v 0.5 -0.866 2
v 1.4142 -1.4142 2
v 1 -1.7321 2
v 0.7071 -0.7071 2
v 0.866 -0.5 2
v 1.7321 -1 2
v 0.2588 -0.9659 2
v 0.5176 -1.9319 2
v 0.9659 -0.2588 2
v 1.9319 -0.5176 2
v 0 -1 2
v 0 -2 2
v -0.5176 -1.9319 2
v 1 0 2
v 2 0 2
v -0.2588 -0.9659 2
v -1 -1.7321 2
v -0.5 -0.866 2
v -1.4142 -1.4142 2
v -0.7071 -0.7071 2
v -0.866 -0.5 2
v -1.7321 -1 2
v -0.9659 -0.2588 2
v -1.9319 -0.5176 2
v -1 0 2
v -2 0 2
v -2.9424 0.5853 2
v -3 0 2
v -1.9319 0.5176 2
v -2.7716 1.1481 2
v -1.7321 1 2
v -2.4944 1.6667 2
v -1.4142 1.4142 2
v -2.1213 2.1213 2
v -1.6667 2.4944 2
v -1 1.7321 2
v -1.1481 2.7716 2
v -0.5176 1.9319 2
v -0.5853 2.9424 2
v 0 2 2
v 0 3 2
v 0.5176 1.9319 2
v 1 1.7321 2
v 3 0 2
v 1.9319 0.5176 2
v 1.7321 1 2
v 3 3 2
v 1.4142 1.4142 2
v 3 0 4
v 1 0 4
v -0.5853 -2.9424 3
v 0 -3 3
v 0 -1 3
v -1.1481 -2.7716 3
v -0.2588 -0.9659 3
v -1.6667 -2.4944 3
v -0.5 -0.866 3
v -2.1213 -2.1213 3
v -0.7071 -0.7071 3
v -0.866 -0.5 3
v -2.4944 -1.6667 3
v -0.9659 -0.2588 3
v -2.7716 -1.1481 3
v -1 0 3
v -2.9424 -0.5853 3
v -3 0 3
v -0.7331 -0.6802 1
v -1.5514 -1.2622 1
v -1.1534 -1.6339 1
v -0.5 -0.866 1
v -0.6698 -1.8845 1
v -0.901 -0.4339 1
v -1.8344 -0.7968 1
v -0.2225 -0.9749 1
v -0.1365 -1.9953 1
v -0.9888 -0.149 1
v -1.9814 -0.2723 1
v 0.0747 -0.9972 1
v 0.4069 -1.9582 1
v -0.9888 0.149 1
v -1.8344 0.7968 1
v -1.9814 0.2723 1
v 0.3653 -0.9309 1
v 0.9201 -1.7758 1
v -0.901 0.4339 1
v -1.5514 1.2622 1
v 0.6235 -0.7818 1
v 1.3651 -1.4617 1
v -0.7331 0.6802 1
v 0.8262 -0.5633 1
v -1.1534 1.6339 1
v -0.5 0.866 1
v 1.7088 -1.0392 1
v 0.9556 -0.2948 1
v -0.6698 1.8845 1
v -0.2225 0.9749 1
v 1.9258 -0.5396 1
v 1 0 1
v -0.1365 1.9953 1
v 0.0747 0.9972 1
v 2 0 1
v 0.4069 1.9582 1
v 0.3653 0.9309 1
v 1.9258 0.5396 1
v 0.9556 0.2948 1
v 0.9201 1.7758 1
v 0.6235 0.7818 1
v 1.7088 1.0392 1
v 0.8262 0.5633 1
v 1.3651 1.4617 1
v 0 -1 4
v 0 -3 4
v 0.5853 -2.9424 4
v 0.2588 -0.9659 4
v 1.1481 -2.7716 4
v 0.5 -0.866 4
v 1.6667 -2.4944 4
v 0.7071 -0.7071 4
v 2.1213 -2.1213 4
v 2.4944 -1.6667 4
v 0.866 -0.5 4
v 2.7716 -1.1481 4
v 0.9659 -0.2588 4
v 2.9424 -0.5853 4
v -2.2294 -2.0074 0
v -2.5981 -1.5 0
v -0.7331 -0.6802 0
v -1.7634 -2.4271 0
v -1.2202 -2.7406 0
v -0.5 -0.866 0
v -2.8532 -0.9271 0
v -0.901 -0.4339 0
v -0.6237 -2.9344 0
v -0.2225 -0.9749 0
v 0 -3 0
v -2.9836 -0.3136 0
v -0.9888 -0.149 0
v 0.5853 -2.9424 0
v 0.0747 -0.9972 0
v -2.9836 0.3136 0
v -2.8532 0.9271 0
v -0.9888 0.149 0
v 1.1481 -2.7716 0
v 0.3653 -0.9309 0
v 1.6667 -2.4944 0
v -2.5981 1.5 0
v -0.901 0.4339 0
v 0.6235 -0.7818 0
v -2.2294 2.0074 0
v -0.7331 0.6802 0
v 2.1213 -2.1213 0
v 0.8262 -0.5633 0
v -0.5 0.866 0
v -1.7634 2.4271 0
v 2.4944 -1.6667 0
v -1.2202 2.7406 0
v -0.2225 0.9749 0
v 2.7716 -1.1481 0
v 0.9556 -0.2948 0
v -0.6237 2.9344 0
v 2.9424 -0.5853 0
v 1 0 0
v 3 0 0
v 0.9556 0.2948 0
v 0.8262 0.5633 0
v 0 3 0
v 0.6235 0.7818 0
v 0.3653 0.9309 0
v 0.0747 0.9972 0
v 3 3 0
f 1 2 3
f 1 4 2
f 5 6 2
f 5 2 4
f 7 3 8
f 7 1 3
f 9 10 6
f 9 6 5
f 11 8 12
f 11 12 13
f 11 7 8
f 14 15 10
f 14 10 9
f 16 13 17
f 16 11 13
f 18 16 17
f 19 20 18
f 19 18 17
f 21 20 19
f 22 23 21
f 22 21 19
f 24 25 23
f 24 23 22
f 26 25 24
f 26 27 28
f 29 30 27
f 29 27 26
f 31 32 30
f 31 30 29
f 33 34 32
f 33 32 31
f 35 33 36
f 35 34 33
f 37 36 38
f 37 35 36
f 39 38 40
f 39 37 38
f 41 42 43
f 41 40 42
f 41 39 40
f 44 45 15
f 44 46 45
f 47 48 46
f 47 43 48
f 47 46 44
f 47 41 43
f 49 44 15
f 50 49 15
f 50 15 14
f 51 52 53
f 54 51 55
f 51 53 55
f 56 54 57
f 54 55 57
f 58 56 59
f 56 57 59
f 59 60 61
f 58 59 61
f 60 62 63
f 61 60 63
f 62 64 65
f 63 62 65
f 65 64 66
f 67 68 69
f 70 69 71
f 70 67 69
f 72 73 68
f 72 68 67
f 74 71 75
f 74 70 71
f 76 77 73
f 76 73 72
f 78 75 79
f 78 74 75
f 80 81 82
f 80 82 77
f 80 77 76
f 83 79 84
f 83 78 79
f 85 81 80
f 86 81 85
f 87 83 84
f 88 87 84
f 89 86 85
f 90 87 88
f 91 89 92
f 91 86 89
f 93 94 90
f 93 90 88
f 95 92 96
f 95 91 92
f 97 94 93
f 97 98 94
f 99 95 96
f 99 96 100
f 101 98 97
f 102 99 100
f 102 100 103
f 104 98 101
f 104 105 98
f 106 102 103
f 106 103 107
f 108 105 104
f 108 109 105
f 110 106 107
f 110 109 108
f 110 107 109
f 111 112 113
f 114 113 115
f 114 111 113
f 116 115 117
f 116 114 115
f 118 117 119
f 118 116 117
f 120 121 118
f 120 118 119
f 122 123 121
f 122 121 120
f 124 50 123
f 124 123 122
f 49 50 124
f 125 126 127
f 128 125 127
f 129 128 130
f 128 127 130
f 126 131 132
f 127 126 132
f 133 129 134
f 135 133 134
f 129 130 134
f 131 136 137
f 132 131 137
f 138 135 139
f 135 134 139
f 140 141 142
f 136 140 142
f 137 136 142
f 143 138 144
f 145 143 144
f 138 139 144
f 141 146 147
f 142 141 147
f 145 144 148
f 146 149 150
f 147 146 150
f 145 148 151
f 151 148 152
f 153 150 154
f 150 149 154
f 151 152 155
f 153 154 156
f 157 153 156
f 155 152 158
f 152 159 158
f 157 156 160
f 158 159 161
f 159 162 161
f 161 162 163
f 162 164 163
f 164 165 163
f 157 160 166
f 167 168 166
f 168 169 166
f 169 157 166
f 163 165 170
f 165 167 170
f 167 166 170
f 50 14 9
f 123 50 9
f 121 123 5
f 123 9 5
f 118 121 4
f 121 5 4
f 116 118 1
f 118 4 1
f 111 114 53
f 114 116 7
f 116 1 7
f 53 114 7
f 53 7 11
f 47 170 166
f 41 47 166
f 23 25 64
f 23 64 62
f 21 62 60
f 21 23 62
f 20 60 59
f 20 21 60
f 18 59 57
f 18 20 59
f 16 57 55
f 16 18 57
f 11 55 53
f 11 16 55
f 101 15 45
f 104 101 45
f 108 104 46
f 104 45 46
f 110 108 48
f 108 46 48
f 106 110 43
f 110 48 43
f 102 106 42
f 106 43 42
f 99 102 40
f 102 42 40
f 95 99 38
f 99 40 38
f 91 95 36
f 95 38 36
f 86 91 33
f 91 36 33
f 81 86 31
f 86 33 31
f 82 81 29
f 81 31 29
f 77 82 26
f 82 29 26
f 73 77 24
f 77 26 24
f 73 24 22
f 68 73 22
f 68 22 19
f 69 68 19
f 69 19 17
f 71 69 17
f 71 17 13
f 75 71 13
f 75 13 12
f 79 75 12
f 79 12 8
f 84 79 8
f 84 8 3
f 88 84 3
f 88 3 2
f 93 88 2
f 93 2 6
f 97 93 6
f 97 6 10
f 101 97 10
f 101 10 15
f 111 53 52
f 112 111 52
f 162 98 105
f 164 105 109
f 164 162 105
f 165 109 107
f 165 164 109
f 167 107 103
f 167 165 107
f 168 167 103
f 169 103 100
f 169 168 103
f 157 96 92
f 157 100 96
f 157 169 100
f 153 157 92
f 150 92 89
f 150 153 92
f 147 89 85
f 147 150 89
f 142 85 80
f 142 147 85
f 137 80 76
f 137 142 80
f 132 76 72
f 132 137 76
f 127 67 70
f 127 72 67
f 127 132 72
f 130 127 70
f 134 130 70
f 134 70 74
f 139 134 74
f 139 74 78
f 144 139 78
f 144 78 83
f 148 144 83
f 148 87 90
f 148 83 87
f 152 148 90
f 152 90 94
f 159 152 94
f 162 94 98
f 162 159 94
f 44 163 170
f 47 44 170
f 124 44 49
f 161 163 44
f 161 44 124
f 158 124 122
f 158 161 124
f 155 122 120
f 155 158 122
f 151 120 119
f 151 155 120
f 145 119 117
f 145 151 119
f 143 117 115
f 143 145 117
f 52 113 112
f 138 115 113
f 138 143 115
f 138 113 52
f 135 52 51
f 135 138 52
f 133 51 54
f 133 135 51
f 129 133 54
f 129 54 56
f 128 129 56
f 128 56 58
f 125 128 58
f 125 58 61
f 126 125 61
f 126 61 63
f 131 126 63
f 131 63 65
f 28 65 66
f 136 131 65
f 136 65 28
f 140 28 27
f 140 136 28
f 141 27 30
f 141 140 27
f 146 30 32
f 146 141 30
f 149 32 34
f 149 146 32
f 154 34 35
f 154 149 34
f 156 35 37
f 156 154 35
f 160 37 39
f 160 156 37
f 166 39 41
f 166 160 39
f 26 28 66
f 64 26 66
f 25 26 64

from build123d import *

# Parameters (mm, degrees)
SKETCH1_R           = 1
BOSS_EXTRUDE1_DEPTH = 2
SKETCH2_R           = 2
CUT_EXTRUDE1_DEPTH  = 1
BOSS_EXTRUDE2_DEPTH = 2
BOSS_EXTRUDE3_DEPTH = 1


with BuildPart() as part:
    # Sketch1 → Boss-Extrude1 (new body)
    with BuildSketch(Plane.XY):
        with BuildLine():
            Line((3, 0), (3, 3))
            Line((3, 3), (0, 3))
            ThreePointArc((0, 3), (-3, 0), (0, -3))
            ThreePointArc((0, -3), (2.121320344, -2.121320344), (3, 0))
        make_face()
        Circle(SKETCH1_R, mode=Mode.SUBTRACT)
    extrude(amount=BOSS_EXTRUDE1_DEPTH)

    # Sketch2 → Cut-Extrude1 (cut)
    with BuildSketch(Plane.XY.offset(2)):
        Circle(SKETCH2_R)
    extrude(amount=-CUT_EXTRUDE1_DEPTH, mode=Mode.SUBTRACT)

    # Sketch3 → Boss-Extrude2 (add)
    with BuildSketch(Plane.XY.offset(2)):
        with BuildLine():
            Line((0, -2), (0, -3))
            ThreePointArc((0, -3), (2.121320344, -2.121320344), (3, 0))
            Line((3, 0), (2, 0))
            Line((2, 0), (1, 0))
            ThreePointArc((1, 0), (0.707106781, -0.707106781), (0, -1))
            Line((0, -1), (0, -2))
        make_face()
    extrude(amount=BOSS_EXTRUDE2_DEPTH)

    # Sketch4 → Boss-Extrude3 (add)
    with BuildSketch(Plane.XY.offset(2)):
        with BuildLine():
            Line((-3, 0), (-2, 0))
            Line((-2, 0), (-1, 0))
            ThreePointArc((-1, 0), (-0.707106781, -0.707106781), (0, -1))
            Line((0, -1), (0, -2))
            Line((0, -2), (0, -3))
            ThreePointArc((0, -3), (-2.121320344, -2.121320344), (-3, 0))
        make_face()
    extrude(amount=BOSS_EXTRUDE3_DEPTH)


solid = part.part
